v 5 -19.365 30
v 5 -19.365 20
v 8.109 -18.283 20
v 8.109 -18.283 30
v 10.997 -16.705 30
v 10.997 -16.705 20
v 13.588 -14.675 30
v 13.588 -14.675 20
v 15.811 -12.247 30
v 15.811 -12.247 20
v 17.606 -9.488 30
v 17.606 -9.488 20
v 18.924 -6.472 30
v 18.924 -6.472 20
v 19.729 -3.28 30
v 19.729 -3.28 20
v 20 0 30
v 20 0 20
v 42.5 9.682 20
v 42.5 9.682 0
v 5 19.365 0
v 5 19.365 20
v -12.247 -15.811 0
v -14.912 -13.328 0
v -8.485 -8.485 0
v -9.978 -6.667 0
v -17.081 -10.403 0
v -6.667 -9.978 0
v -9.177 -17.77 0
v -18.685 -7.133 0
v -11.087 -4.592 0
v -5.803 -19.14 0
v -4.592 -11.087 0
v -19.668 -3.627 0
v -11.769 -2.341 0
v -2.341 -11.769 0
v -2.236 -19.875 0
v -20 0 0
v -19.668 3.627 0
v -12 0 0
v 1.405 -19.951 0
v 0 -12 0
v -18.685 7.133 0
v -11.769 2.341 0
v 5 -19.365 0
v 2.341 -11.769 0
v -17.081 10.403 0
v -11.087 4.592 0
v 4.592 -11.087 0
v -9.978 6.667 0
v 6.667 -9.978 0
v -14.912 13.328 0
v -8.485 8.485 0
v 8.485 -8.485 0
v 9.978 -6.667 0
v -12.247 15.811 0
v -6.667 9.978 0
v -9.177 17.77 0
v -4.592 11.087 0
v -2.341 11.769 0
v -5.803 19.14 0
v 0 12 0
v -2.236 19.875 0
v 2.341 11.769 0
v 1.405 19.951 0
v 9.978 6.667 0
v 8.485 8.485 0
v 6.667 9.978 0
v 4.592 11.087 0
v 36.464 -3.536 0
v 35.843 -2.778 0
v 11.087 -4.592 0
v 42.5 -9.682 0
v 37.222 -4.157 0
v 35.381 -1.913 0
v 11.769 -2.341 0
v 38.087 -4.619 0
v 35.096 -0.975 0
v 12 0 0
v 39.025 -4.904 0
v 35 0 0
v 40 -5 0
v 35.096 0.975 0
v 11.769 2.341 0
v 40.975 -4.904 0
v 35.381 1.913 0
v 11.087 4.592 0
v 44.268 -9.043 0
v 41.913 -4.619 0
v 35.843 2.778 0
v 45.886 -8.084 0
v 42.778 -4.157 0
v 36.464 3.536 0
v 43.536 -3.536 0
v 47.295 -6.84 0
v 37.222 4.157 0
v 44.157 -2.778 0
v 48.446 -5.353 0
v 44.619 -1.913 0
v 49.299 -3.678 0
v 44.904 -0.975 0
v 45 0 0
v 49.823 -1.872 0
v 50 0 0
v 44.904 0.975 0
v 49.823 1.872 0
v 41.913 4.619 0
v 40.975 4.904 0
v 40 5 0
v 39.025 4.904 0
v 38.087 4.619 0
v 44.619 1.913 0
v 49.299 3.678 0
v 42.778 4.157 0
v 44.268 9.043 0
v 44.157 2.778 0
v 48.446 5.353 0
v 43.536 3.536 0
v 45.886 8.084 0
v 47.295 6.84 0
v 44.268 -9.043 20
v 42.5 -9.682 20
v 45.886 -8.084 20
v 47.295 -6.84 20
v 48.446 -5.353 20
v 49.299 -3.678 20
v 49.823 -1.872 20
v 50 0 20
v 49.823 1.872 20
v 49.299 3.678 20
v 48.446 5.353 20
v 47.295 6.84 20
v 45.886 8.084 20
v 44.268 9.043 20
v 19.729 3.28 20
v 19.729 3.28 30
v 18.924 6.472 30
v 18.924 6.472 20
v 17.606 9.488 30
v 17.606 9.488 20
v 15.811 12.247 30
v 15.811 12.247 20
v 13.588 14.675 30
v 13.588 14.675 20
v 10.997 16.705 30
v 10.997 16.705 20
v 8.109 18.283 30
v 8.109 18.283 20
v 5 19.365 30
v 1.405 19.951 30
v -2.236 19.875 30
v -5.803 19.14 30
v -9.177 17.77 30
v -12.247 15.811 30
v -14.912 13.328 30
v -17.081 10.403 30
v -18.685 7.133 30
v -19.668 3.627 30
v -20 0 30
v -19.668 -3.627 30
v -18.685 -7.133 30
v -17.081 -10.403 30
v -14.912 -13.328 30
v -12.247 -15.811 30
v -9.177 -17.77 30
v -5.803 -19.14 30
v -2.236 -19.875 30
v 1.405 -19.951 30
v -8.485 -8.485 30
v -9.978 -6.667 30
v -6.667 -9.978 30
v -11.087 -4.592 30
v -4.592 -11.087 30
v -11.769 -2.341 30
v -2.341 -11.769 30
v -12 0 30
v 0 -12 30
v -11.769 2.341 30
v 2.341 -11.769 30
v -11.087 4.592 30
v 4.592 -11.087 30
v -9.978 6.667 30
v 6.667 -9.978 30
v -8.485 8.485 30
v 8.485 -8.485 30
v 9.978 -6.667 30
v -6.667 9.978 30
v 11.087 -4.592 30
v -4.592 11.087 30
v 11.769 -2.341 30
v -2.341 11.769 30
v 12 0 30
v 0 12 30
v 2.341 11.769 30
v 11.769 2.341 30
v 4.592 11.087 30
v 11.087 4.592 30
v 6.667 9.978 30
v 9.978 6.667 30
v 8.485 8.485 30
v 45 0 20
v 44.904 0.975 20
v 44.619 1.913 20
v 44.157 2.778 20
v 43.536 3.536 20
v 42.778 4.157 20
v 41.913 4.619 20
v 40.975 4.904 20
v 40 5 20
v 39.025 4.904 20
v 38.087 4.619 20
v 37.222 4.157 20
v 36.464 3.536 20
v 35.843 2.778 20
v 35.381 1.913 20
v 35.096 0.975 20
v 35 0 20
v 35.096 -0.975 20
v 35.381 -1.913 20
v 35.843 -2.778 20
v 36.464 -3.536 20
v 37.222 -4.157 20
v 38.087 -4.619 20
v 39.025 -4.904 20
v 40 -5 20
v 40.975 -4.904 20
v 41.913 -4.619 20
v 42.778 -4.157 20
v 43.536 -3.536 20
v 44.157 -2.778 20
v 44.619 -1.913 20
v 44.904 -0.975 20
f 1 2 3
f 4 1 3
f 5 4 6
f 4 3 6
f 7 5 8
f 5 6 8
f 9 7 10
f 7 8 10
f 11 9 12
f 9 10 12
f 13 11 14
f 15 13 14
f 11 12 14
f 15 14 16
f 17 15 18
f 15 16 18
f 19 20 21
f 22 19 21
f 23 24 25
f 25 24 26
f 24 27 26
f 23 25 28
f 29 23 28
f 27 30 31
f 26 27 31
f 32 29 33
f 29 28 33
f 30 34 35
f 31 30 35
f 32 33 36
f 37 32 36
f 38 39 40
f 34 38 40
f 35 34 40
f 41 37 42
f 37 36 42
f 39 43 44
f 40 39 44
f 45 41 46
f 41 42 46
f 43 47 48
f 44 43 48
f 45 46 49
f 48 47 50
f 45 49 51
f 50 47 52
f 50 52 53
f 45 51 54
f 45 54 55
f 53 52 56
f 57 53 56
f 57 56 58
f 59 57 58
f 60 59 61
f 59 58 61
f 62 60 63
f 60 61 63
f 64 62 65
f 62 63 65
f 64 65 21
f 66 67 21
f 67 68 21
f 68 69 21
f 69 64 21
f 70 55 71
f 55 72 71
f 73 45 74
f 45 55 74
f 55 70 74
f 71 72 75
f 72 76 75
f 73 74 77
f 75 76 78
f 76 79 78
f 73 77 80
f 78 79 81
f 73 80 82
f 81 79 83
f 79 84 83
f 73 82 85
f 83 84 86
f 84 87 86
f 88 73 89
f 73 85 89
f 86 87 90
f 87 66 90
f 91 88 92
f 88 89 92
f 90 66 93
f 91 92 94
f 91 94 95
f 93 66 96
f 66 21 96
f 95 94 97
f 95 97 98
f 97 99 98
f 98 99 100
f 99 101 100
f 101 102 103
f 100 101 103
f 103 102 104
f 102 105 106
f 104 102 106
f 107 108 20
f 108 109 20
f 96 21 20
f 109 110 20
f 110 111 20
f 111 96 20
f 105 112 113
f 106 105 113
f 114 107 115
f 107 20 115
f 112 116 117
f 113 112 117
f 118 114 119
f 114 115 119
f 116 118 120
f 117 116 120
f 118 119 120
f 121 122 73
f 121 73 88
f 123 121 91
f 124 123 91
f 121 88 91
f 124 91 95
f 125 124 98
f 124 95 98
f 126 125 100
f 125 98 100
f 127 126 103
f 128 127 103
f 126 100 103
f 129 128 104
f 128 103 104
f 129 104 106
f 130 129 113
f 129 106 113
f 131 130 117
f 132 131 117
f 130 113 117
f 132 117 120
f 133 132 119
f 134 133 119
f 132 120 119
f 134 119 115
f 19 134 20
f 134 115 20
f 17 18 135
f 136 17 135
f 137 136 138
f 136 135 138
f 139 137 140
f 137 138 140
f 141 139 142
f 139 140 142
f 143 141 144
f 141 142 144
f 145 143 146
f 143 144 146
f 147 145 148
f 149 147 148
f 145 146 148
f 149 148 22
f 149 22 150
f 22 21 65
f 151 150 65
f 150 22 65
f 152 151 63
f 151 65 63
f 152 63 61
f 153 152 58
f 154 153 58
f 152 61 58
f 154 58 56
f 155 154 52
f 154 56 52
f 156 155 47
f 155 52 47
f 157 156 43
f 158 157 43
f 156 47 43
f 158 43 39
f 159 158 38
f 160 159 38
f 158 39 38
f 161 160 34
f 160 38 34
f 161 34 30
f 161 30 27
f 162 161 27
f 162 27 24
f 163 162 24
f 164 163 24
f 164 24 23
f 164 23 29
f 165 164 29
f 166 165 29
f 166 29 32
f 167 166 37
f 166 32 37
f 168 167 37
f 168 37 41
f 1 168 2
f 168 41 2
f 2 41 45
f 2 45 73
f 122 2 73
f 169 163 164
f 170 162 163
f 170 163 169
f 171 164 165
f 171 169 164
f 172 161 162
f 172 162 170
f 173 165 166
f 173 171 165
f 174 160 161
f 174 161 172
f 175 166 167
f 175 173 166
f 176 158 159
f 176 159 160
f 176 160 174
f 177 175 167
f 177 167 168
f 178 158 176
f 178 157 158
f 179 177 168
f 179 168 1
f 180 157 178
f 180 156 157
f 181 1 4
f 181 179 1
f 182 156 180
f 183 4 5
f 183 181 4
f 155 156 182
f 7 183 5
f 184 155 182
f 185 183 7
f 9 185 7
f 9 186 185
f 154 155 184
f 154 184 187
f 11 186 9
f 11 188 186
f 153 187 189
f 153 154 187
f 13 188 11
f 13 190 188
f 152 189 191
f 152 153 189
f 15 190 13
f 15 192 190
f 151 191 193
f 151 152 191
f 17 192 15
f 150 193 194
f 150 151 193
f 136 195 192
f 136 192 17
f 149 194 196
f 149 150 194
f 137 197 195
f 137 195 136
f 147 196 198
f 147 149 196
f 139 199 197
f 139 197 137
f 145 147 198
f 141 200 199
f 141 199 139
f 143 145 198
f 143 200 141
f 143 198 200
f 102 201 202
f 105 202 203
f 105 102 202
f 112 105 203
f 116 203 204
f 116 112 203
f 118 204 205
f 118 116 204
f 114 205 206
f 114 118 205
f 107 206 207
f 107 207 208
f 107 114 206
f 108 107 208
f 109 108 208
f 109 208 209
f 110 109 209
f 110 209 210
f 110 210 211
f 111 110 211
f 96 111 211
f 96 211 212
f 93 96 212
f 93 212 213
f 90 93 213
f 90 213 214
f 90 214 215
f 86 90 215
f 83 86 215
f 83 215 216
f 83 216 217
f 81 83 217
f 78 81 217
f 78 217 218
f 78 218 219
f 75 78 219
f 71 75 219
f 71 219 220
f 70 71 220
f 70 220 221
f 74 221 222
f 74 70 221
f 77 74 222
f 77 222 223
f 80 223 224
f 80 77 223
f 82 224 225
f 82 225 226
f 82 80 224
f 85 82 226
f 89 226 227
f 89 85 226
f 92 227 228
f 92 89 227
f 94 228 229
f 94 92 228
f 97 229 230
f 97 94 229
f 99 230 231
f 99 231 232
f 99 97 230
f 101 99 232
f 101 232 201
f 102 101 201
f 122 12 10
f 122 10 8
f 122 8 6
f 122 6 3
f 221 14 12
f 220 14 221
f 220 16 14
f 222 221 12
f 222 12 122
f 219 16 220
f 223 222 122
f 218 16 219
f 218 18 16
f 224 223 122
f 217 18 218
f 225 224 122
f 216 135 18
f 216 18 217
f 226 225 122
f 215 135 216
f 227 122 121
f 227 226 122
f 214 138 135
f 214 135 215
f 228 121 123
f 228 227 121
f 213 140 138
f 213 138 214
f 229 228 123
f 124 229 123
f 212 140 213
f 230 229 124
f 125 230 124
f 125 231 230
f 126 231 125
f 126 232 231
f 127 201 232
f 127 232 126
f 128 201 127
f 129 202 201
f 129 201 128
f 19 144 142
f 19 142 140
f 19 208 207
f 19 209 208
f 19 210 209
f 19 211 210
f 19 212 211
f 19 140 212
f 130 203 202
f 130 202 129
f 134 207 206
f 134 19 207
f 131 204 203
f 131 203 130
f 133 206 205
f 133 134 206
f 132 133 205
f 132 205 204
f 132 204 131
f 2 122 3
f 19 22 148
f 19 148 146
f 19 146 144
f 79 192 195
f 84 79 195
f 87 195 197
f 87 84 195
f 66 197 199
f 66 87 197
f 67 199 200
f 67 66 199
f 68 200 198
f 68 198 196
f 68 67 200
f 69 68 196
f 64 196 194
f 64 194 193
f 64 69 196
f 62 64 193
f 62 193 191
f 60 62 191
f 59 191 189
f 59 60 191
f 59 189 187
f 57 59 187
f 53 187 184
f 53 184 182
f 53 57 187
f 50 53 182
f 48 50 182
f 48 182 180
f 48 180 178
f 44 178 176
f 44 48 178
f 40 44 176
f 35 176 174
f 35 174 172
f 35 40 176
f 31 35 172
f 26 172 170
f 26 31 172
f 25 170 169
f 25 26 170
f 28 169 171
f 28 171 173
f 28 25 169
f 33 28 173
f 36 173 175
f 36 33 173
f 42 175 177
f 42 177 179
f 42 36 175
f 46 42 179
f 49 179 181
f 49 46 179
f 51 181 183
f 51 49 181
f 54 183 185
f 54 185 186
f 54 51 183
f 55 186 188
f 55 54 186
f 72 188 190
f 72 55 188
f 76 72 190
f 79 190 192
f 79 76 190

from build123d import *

# Parameters (mm, degrees)
F0_R     = 5
F1_DEPTH = 15
F0_R_2   = 12
F2_DEPTH = 30
F3_DEPTH = 20


with BuildPart() as f1:
    # F0 (on Top) → F1 (new body)
    with BuildSketch(Plane.XY):
        with BuildLine():
            ThreePointArc((5, 19.364917), (15.811388, 12.247449), (20, 0))
            ThreePointArc((20, 0), (15.811388, -12.247449), (5, -19.364917))
            Line((5, -19.364917), (42.5, -9.682458))
            ThreePointArc((42.5, -9.682458), (50, 0), (42.5, 9.682458))
            Line((42.5, 9.682458), (5, 19.364917))
        make_face()
        with Locations((40, 0)):
            Circle(F0_R, mode=Mode.SUBTRACT)
    extrude(amount=F1_DEPTH)

    # F0 (on Top) → F2 (join)
    with BuildSketch(Plane.XY):
        with BuildLine():
            ThreePointArc((5, -19.364917), (15.811388, -12.247449), (20, 0))
            ThreePointArc((20, 0), (15.811388, 12.247449), (5, 19.364917))
            ThreePointArc((5, 19.364917), (-20, 0), (5, -19.364917))
        make_face()
        Circle(F0_R_2, mode=Mode.SUBTRACT)
    extrude(amount=F2_DEPTH)

    # F0 (on Top) → F3 (join)
    with BuildSketch(Plane.XY):
        with BuildLine():
            ThreePointArc((5, 19.364917), (15.811388, 12.247449), (20, 0))
            ThreePointArc((20, 0), (15.811388, -12.247449), (5, -19.364917))
            Line((5, -19.364917), (42.5, -9.682458))
            ThreePointArc((42.5, -9.682458), (50, 0), (42.5, 9.682458))
            Line((42.5, 9.682458), (5, 19.364917))
        make_face()
        with Locations((40, 0)):
            Circle(F0_R, mode=Mode.SUBTRACT)
    extrude(amount=F3_DEPTH)


solid = f1.part
